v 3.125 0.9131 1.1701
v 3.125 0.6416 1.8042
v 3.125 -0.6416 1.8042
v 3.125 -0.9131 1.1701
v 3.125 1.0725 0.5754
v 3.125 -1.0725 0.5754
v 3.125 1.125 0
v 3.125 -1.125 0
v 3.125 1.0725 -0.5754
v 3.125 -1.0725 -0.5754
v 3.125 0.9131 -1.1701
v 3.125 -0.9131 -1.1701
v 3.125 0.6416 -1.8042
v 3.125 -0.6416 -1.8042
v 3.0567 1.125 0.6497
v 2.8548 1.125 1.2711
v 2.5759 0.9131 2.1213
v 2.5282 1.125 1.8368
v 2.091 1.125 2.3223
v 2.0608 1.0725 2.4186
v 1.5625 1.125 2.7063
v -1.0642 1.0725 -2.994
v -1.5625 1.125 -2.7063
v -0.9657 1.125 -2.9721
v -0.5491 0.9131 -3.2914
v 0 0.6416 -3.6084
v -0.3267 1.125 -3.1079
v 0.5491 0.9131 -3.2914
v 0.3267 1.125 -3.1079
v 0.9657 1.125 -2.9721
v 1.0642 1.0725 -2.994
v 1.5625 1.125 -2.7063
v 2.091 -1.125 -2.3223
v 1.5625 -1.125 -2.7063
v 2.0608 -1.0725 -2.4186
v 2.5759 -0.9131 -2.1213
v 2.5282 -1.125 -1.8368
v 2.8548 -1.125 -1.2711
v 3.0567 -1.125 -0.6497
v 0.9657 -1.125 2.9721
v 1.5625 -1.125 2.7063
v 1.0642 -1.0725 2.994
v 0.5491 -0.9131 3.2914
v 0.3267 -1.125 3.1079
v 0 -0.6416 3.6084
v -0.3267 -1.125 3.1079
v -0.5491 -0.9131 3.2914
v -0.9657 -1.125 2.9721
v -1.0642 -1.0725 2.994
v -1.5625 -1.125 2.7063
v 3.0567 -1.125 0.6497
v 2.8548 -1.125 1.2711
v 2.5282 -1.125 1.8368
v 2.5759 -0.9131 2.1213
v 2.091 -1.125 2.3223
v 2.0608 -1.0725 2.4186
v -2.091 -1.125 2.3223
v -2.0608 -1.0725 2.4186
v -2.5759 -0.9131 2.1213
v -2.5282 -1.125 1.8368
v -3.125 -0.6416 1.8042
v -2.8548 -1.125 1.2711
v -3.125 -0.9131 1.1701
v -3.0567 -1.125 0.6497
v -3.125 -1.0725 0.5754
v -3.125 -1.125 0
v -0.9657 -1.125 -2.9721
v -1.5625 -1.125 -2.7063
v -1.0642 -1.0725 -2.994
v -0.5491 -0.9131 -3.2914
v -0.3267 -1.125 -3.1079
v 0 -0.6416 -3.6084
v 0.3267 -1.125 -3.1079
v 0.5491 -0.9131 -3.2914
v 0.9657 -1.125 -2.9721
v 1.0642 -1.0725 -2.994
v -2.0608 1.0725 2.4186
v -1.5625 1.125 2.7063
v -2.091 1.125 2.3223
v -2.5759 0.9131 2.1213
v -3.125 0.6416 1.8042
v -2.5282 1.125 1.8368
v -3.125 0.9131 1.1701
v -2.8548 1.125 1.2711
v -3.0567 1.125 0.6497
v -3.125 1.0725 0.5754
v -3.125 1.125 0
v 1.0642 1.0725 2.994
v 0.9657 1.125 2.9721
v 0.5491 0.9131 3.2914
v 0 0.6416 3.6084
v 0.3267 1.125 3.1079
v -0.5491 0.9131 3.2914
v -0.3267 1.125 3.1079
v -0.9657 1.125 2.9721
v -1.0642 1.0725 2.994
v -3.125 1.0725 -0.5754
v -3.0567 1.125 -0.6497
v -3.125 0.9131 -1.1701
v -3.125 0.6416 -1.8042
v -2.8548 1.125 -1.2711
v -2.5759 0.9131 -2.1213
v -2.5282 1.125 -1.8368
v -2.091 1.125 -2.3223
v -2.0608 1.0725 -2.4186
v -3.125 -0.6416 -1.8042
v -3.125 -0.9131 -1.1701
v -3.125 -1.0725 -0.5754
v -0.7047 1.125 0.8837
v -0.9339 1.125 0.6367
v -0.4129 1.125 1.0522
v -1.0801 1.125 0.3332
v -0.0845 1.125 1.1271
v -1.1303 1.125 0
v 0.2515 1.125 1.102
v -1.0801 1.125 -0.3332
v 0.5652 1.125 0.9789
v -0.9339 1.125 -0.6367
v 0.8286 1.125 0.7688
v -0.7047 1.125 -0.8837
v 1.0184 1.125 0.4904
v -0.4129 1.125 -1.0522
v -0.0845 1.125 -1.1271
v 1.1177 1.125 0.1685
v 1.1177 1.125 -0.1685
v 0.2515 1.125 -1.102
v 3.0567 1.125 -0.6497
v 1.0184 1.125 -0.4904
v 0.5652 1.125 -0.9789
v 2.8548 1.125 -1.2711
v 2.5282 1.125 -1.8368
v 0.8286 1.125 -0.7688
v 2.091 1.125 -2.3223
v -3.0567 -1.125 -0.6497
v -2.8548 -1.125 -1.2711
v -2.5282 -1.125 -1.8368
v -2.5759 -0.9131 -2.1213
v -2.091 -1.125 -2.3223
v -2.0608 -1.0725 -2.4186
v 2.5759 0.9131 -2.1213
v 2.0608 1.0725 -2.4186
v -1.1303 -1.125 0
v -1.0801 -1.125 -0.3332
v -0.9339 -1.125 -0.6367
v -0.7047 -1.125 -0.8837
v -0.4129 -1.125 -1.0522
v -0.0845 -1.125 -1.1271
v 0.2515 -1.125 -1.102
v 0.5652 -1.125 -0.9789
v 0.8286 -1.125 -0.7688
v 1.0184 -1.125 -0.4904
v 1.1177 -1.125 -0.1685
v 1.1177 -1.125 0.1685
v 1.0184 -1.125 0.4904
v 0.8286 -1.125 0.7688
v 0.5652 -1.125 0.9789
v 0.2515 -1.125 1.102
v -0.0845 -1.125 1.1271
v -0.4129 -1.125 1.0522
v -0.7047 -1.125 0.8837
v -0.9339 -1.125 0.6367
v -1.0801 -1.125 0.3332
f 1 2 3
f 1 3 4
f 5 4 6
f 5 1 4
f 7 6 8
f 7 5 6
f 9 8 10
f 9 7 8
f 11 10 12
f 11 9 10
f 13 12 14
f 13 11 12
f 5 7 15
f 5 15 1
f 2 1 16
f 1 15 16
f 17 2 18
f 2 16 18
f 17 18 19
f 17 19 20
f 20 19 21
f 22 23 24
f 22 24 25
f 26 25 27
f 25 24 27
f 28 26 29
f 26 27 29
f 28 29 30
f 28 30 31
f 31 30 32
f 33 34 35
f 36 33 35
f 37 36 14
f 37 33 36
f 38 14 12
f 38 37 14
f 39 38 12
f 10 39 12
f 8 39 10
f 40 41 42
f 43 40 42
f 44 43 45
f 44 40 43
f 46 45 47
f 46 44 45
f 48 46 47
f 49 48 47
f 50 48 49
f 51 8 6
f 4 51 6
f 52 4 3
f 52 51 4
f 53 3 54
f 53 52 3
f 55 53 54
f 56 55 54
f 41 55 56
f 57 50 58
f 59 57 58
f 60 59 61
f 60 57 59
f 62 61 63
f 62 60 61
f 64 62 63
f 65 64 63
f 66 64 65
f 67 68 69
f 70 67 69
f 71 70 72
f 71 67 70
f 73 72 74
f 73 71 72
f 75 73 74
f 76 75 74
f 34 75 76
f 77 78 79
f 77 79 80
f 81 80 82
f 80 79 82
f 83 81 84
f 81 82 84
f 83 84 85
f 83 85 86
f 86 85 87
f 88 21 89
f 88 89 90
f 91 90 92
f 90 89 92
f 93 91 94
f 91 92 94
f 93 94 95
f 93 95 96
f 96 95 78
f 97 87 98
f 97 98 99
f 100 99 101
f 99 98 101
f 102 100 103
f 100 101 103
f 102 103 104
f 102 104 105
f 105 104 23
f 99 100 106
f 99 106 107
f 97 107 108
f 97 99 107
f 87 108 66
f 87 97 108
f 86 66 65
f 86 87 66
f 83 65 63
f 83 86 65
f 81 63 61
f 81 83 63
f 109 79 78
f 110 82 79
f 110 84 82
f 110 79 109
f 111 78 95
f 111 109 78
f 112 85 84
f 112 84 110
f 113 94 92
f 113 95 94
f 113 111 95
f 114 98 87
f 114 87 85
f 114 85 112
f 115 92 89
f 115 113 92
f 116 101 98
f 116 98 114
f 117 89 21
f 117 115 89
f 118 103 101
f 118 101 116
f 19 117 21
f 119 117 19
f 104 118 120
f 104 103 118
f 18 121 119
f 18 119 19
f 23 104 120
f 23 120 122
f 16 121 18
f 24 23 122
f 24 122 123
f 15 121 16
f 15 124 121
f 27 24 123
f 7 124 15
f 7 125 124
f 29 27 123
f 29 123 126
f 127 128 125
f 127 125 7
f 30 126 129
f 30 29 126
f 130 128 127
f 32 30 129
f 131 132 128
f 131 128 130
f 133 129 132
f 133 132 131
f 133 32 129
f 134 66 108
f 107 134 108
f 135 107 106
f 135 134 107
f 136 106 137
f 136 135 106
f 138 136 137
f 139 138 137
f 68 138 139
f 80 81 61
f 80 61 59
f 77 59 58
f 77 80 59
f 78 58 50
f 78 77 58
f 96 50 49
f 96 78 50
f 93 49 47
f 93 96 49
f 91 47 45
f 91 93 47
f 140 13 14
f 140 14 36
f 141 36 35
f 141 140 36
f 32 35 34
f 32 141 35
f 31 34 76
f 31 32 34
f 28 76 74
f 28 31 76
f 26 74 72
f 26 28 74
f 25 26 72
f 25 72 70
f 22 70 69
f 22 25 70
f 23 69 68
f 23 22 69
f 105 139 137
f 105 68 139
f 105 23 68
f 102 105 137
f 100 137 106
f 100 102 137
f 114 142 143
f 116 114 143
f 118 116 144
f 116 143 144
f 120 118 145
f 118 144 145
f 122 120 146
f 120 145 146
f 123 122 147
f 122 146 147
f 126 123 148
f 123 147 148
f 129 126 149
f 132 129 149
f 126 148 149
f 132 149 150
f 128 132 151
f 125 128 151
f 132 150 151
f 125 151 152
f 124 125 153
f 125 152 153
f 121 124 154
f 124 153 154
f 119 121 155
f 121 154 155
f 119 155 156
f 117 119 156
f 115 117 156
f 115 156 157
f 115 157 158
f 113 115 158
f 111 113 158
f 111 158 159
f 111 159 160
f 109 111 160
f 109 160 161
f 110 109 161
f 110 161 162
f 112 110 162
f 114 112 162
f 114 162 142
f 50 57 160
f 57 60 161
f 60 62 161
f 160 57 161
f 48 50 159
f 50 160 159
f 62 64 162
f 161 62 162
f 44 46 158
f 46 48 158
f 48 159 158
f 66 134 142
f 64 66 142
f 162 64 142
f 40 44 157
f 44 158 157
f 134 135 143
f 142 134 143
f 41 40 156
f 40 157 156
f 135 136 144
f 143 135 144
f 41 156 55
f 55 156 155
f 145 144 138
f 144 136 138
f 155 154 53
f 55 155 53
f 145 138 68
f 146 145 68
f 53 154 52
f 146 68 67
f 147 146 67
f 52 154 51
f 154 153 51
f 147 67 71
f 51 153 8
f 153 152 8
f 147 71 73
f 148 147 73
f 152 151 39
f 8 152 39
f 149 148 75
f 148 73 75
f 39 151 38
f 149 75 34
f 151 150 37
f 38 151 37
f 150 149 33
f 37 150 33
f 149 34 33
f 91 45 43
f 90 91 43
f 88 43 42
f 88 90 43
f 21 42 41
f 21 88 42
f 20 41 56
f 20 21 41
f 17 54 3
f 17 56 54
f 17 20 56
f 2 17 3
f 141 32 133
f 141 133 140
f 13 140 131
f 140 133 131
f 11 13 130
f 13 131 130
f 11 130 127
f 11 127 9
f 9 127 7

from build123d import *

# Parameters (mm, degrees)
BOSS_EXTRUDE1_DEPTH       = 1.125
F_4_40_TAPPED_HOLE1_D     = 2.2606
F_4_40_TAPPED_HOLE1_DEPTH = 8.87
F_4_40_TAPPED_HOLE1_TIP   = 0.679152758


with BuildPart() as part:
    # Sketch1 → Boss-Extrude1 (new, symmetric)
    with BuildSketch(Plane(origin=(0, 0, 0), x_dir=(1, 0, 0), z_dir=(0, 1, 0))):
        Polygon((0, 3.608439182), (-3.125, 1.804219591), (-3.125, -1.804219591), (0, -3.608439182), (3.125, -1.804219591), (3.125, 1.804219591), align=None)
    extrude(amount=BOSS_EXTRUDE1_DEPTH, both=True)

    # Sketch2 → Cut-Revolve2 (revolve, cut)
    with BuildSketch(Plane.XY):
        Polygon((-4.25, 1.125), (-4.25, 0), (-3.125, 1.125), align=None)
    cut_revolve2 = revolve(axis=Axis((0, 4.25, 0), (0, -1, 0)), mode=Mode.SUBTRACT)

    # Mirror1: Cut-Revolve2 across plane
    add(cut_revolve2.mirror(Plane.ZX), mode=Mode.SUBTRACT)

    # #4-40 Tapped Hole1
    with Locations(Plane(origin=(0, 1.125, 0), x_dir=(1, 0, 0), z_dir=(0, 1, 0))):
        with Locations((0, 0)):
            Hole(F_4_40_TAPPED_HOLE1_D / 2, depth=F_4_40_TAPPED_HOLE1_DEPTH)
            with Locations((0, 0, -(F_4_40_TAPPED_HOLE1_DEPTH + F_4_40_TAPPED_HOLE1_TIP / 2))):  # 118° drill point
                Cone(0, F_4_40_TAPPED_HOLE1_D / 2, F_4_40_TAPPED_HOLE1_TIP, mode=Mode.SUBTRACT)


solid = part.part
